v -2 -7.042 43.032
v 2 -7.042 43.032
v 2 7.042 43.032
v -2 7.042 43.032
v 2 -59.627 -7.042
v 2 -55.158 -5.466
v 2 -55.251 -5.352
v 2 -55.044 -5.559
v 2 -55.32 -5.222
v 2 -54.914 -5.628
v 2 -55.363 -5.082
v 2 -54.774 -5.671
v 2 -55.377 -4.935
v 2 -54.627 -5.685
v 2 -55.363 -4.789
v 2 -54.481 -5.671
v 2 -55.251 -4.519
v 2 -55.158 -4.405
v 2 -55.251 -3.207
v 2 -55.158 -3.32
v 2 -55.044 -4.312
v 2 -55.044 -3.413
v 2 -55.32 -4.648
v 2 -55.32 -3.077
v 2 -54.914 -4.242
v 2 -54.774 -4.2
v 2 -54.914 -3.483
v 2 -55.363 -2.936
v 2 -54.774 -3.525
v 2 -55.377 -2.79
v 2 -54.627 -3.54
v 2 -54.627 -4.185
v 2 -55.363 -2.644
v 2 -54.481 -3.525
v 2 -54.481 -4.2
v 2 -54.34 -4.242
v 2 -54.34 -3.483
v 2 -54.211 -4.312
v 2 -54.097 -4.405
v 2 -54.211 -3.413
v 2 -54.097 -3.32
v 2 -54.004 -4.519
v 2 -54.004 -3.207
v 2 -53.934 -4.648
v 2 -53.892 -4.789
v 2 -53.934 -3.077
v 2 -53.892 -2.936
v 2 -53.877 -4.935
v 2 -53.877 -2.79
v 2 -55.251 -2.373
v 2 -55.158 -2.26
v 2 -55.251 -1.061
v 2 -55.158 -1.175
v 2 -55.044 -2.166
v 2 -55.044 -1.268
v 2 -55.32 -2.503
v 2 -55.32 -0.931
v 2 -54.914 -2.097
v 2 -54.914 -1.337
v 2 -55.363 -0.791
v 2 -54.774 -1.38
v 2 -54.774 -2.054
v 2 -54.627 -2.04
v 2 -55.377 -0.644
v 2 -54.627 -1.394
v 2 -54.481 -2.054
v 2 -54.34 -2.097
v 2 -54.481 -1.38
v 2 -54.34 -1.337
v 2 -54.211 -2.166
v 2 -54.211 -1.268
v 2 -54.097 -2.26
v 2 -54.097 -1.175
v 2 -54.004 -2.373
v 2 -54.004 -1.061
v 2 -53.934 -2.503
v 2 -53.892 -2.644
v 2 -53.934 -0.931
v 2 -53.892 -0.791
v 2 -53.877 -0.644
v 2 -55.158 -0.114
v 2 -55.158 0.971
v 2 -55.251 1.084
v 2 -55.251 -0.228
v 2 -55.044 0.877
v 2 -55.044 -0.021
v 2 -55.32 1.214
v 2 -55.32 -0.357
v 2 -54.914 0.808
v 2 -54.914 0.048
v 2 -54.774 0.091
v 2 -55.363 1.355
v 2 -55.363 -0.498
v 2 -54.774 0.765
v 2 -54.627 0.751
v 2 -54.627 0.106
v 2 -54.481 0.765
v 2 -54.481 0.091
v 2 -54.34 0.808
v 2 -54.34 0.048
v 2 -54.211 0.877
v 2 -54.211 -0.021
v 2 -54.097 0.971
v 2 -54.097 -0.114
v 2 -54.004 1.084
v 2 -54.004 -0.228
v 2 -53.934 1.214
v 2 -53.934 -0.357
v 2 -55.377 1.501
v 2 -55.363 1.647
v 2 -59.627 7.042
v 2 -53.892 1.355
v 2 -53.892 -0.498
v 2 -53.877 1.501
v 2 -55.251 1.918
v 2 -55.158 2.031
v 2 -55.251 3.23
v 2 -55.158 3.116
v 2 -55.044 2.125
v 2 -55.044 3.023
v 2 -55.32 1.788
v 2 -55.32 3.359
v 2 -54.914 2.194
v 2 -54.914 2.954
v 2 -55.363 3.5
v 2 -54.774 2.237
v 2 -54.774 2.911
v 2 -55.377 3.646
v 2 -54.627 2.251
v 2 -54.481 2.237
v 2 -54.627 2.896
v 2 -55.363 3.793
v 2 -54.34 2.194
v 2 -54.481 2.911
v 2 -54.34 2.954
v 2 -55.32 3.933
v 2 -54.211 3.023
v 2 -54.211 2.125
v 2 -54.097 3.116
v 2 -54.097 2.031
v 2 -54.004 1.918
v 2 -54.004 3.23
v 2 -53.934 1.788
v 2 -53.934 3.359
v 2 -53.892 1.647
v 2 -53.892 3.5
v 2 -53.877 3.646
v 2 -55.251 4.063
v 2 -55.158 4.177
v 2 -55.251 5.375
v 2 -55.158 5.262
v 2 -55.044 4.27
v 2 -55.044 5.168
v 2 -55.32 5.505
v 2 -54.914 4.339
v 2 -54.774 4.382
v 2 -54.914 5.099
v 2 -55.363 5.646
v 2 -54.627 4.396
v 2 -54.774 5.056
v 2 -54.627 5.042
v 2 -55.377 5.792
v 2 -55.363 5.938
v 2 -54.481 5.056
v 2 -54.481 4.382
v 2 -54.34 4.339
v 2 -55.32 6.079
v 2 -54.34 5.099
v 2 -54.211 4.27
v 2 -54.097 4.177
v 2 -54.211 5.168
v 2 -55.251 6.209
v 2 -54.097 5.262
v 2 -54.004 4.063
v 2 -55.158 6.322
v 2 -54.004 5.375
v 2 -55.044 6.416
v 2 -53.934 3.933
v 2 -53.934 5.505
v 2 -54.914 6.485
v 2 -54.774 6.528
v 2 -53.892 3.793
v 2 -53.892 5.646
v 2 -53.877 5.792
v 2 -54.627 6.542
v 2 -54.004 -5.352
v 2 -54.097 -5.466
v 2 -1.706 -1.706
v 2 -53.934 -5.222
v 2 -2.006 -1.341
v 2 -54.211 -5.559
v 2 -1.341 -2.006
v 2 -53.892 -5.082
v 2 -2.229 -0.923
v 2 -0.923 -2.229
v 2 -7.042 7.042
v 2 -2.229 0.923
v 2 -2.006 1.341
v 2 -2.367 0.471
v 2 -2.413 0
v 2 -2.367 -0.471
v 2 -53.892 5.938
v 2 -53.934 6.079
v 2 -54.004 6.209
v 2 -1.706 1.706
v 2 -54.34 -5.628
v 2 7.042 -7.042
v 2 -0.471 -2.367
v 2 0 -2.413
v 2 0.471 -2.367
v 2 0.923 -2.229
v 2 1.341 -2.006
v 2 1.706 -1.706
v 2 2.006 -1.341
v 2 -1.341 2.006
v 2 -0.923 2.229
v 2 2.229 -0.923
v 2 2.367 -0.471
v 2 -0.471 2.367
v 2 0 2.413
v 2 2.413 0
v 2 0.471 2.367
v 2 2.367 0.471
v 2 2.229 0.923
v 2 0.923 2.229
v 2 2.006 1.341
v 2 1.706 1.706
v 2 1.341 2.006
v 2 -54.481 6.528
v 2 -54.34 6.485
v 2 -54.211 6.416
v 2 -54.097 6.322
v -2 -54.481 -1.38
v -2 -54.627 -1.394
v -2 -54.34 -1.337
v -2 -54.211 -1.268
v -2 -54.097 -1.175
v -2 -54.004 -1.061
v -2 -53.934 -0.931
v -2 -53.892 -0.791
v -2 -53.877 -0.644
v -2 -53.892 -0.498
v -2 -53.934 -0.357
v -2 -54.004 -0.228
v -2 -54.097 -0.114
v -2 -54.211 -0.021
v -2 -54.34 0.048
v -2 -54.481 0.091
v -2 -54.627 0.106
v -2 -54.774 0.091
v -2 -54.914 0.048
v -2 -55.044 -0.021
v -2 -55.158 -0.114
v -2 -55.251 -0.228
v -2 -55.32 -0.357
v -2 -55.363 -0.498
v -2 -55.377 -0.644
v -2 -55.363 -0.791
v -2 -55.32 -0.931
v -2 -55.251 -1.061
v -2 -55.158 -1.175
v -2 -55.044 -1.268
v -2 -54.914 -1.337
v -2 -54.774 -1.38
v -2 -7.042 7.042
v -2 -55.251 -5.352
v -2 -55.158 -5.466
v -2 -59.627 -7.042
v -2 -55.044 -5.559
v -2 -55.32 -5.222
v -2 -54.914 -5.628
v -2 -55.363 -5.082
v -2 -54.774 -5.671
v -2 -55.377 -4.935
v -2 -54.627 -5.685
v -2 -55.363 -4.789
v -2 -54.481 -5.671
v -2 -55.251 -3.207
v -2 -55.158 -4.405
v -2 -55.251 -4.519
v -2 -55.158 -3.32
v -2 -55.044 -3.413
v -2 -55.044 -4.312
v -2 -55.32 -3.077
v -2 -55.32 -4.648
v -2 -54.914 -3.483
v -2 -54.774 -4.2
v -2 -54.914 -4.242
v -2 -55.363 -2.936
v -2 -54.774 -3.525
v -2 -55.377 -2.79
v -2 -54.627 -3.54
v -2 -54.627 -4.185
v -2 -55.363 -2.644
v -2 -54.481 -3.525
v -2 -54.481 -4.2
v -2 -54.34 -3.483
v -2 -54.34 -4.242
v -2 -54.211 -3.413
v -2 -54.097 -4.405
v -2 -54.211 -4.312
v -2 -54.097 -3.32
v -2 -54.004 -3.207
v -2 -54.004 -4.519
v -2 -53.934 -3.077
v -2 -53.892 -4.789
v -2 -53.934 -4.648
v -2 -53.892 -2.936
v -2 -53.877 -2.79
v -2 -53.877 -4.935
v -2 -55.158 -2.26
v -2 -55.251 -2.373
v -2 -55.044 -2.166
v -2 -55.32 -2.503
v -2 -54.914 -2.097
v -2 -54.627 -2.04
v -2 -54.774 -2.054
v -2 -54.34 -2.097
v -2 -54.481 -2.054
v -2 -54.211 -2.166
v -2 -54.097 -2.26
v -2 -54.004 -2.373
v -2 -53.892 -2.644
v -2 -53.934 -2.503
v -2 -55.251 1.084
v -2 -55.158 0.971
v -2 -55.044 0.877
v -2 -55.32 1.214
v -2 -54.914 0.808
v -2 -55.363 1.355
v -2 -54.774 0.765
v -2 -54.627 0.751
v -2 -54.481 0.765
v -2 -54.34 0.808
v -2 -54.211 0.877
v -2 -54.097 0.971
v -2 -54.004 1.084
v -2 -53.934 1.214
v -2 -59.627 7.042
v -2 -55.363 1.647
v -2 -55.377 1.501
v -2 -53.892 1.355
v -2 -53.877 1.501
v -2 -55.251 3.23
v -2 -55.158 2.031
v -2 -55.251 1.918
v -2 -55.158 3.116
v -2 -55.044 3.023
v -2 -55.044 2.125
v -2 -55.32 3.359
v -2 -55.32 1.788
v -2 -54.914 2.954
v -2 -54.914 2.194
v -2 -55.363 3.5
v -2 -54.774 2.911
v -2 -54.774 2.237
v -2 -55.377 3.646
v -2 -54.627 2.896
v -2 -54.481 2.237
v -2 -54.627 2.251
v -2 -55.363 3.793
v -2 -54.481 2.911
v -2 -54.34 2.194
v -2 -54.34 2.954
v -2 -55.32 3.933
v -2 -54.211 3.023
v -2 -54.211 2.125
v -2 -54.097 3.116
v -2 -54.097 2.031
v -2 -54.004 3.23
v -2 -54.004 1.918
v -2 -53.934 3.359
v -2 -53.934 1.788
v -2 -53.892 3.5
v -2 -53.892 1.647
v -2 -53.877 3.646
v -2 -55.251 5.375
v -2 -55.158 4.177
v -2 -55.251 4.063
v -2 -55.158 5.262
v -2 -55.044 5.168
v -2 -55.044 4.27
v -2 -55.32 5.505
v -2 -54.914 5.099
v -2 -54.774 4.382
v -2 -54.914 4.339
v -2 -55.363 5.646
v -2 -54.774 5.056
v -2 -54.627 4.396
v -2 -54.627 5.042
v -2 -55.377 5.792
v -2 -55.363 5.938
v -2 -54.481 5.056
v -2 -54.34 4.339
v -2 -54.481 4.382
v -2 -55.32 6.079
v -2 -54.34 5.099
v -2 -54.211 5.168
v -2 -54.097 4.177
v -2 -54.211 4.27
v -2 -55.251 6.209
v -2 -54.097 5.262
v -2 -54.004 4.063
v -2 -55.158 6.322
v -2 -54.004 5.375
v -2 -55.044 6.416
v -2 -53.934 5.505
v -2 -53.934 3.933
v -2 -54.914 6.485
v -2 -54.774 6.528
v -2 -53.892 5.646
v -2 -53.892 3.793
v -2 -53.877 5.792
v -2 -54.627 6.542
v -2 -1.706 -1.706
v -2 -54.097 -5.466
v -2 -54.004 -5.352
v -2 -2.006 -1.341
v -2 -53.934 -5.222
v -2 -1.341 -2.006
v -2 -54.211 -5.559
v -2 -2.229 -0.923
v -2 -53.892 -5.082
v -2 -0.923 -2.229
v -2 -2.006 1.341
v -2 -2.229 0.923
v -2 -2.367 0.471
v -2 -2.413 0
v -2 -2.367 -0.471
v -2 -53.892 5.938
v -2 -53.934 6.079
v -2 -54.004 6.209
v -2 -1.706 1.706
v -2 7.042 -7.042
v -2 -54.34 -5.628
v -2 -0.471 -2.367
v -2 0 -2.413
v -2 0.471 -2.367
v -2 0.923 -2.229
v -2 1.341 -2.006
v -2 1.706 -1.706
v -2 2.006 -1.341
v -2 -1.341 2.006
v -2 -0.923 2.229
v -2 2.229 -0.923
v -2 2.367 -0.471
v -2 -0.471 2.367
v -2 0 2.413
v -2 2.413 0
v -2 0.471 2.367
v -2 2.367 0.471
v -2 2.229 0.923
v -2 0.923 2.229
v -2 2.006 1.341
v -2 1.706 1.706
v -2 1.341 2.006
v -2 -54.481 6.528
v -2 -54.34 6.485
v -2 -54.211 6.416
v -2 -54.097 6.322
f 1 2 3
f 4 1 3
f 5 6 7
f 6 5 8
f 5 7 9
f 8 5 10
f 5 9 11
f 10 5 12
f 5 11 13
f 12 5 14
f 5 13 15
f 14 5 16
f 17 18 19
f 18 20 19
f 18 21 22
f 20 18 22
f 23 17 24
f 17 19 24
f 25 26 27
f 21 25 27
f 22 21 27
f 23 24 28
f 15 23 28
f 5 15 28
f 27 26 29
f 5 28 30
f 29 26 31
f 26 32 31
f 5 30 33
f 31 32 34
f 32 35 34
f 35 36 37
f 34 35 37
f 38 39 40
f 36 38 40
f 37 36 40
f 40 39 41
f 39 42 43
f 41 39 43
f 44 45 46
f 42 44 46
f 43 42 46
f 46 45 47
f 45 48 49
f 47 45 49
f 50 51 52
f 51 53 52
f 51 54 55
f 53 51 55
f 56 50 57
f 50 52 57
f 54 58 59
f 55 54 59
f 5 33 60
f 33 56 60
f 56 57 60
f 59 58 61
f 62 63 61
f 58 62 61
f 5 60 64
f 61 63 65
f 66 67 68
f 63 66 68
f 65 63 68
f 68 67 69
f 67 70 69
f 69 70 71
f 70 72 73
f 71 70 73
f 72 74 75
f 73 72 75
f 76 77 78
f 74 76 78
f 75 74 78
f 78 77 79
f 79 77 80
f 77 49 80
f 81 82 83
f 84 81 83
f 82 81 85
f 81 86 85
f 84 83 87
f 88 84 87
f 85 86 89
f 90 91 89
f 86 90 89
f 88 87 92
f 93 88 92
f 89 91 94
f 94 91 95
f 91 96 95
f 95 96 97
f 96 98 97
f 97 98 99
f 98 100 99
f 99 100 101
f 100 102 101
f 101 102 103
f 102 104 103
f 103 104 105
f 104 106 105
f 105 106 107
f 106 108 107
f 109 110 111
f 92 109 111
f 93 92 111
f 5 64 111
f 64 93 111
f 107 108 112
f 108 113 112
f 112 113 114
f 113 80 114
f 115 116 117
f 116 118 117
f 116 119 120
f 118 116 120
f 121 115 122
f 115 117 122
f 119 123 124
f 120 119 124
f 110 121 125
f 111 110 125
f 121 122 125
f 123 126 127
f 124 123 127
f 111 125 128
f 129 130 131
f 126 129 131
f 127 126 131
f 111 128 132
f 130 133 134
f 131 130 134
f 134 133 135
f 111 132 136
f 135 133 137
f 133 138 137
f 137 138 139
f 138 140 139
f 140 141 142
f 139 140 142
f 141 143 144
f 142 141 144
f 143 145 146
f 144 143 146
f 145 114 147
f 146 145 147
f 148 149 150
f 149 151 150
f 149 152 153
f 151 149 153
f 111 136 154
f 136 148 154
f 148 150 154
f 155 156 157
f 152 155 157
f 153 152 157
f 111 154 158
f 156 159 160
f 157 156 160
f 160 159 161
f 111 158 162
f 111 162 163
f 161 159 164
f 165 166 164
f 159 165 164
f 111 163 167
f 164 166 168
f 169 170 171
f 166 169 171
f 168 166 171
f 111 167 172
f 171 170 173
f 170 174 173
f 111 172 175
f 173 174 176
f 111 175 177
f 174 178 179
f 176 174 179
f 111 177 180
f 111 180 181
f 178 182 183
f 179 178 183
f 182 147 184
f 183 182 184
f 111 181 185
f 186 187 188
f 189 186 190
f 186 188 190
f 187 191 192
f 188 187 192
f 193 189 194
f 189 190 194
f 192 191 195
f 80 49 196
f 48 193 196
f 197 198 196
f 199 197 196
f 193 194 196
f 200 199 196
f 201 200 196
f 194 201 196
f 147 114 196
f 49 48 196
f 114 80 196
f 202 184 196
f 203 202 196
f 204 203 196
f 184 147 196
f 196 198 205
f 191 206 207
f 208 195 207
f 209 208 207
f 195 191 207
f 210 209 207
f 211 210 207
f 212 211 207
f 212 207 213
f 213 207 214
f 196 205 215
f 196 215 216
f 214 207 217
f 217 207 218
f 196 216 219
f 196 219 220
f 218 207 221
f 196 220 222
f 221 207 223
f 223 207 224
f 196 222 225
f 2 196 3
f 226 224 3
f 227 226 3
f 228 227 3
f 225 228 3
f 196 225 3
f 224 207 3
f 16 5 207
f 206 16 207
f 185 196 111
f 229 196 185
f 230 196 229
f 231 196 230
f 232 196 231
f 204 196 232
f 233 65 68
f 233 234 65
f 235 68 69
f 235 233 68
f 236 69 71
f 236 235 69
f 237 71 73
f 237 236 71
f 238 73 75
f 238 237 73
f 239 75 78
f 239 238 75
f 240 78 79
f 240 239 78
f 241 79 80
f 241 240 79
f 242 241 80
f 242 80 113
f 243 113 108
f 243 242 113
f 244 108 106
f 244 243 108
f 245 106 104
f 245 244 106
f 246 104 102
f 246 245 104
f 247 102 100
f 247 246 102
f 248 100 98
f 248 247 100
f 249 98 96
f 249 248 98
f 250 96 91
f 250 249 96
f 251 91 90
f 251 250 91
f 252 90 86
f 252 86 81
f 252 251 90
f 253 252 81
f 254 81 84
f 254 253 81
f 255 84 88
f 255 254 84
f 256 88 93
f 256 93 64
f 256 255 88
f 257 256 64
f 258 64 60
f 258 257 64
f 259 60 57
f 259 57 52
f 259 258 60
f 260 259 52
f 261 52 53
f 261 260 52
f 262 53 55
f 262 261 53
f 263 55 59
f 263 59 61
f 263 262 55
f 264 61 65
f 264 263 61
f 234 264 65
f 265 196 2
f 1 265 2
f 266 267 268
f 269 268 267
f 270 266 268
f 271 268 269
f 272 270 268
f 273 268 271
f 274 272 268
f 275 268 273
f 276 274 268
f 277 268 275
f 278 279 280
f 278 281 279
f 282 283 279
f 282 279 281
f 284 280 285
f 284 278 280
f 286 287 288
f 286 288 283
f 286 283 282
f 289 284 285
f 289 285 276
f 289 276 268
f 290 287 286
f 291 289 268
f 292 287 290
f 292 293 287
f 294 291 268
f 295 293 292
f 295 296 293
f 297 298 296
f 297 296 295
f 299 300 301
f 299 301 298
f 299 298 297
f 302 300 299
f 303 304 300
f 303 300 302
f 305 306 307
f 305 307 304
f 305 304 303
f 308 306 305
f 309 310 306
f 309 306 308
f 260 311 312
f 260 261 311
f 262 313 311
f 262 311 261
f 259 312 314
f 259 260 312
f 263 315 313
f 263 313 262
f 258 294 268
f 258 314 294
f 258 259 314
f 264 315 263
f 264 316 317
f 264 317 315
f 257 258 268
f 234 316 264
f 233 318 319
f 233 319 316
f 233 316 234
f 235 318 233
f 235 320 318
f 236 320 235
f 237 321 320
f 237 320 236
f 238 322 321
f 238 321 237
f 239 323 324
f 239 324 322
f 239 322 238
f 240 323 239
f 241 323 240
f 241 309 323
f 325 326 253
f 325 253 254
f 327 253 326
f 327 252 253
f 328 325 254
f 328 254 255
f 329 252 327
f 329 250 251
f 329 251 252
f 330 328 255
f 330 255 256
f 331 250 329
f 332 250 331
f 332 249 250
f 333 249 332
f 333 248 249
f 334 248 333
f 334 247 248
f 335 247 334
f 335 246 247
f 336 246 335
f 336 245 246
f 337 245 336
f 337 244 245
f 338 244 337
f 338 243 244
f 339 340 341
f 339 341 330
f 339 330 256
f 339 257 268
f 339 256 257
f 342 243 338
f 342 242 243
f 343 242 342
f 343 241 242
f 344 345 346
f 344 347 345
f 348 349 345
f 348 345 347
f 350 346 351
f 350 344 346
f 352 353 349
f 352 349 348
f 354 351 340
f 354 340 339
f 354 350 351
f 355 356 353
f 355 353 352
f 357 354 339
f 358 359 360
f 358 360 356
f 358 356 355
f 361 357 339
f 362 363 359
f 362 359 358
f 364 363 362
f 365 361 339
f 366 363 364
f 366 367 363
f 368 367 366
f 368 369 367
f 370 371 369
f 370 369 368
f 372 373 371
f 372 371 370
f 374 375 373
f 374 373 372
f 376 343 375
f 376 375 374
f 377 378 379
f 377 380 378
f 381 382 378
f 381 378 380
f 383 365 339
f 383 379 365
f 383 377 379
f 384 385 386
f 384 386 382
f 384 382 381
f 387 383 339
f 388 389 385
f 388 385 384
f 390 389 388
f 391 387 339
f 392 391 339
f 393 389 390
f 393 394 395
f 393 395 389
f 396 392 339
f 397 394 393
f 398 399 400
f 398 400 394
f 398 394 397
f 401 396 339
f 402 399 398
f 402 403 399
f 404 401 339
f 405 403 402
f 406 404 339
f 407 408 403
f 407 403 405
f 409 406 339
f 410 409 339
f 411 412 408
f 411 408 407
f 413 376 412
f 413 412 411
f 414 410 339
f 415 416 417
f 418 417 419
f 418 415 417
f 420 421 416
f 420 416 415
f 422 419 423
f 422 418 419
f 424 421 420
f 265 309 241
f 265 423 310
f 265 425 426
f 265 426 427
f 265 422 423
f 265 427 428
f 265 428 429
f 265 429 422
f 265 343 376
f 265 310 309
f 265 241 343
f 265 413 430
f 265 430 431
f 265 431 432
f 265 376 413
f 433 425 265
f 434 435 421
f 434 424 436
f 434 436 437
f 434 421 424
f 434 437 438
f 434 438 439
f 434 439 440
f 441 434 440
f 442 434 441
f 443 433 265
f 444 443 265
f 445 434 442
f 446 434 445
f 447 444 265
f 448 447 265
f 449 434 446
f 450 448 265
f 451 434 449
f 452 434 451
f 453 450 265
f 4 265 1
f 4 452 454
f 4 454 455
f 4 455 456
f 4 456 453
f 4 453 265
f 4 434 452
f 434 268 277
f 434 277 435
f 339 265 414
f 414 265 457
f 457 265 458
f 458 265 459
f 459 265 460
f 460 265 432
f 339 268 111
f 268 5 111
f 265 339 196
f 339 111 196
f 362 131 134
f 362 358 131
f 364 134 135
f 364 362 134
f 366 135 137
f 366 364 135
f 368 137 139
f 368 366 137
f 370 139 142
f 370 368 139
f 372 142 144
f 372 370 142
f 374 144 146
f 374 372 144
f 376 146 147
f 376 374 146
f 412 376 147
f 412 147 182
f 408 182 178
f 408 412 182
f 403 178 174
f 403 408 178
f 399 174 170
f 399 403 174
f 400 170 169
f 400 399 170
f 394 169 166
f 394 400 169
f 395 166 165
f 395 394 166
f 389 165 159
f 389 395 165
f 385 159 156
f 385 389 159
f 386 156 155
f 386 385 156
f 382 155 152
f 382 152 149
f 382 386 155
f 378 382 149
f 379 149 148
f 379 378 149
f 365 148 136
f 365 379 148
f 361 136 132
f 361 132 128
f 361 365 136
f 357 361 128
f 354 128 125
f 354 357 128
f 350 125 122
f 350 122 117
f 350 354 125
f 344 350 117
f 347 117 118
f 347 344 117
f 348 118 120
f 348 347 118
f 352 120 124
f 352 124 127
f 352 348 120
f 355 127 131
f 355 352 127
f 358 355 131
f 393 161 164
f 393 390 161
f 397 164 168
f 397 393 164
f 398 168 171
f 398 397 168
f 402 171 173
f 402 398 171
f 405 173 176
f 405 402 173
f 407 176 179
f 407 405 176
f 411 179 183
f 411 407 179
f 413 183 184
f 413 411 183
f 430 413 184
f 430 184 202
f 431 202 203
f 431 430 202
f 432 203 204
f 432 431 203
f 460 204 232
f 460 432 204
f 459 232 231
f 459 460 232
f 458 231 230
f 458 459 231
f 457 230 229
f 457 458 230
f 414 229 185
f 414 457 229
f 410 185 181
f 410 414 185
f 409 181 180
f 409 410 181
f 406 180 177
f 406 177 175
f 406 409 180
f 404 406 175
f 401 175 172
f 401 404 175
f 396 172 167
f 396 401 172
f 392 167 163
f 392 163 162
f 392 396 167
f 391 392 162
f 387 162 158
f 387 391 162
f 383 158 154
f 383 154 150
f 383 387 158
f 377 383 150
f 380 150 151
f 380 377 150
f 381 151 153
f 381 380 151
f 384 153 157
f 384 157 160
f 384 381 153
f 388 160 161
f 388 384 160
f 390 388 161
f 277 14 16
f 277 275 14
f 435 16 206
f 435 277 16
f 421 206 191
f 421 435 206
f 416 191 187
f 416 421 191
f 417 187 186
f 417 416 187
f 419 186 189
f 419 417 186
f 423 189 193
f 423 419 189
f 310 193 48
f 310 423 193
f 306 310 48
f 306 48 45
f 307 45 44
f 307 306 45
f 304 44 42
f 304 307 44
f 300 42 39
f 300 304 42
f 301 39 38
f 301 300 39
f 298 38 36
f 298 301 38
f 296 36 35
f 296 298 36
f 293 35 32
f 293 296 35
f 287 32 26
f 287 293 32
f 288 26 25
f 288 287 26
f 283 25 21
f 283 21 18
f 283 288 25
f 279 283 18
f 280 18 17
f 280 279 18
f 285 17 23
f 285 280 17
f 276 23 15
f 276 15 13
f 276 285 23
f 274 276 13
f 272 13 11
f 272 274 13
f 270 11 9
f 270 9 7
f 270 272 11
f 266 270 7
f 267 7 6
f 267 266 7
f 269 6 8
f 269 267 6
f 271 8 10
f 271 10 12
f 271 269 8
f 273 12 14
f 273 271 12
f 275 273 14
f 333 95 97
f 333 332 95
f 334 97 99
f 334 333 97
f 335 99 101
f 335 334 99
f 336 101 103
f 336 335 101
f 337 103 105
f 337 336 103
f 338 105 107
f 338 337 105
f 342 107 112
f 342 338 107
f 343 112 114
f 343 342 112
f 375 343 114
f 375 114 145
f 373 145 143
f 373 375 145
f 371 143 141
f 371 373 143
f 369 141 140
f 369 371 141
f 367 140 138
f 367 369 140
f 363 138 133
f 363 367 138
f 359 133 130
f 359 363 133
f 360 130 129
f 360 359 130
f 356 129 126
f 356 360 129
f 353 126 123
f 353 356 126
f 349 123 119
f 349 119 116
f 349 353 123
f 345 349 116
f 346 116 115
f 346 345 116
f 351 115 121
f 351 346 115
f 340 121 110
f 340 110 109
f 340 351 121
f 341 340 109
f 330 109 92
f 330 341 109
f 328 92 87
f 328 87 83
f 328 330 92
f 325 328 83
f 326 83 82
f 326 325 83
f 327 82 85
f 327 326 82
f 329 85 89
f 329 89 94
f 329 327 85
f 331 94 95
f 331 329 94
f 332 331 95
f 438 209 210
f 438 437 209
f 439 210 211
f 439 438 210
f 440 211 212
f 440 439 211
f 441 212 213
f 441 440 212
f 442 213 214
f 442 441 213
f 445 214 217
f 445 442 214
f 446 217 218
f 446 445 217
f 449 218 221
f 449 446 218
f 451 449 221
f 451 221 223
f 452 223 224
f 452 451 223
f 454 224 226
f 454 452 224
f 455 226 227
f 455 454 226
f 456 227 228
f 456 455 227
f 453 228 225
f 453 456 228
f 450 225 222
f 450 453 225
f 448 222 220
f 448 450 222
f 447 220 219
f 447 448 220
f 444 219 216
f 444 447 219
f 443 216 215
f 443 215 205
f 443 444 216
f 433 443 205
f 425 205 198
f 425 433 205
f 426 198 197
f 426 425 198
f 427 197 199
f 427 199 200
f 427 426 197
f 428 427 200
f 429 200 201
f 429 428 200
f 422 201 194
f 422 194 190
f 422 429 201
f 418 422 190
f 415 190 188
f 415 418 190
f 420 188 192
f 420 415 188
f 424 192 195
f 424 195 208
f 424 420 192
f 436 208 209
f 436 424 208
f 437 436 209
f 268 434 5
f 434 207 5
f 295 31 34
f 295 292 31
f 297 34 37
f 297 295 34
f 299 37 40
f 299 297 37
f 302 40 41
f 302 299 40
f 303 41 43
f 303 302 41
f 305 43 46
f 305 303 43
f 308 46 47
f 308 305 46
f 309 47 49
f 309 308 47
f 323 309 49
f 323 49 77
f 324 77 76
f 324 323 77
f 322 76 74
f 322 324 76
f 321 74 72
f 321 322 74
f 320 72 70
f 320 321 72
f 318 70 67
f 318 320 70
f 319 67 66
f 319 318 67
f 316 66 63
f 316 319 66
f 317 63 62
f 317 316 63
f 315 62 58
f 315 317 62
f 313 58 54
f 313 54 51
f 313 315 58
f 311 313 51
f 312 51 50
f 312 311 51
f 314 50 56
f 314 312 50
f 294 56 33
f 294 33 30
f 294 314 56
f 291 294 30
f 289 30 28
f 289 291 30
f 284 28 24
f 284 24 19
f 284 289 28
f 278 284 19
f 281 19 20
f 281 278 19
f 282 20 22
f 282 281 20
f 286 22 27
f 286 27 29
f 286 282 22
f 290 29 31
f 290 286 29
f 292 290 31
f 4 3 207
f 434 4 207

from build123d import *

# Parameters (mm, degrees)
SKETCH1_R           = 2.413
SKETCH1_R_2         = 0.75
BOSS_EXTRUDE1_DEPTH = 2


with BuildPart() as part:
    # Sketch1 → Boss-Extrude1 (new, symmetric)
    with BuildSketch(Plane(origin=(0, 0, 0), x_dir=(0, 0, -1), z_dir=(1, 0, 0))):
        Polygon((-43.032150888, 7.041925615), (7.041925615, 7.041925615), (7.041925615, -59.627321198), (-7.041925615, -59.627321198), (-7.041925615, -7.041925615), (-43.032150888, -7.041925615), align=None)
        Circle(SKETCH1_R, mode=Mode.SUBTRACT)
        with Locations((-5.791925615, -54.627321198)):
            Circle(SKETCH1_R_2, mode=Mode.SUBTRACT)
        with Locations((-3.64647107, -54.627321198)):
            Circle(SKETCH1_R_2, mode=Mode.SUBTRACT)
        with Locations((-1.501016524, -54.627321198)):
            Circle(SKETCH1_R_2, mode=Mode.SUBTRACT)
        with Locations((0.644438021, -54.627321198)):
            Circle(SKETCH1_R_2, mode=Mode.SUBTRACT)
        with Locations((2.789892567, -54.627321198)):
            Circle(SKETCH1_R_2, mode=Mode.SUBTRACT)
        with Locations((4.935347112, -54.627321198)):
            Circle(SKETCH1_R_2, mode=Mode.SUBTRACT)
    extrude(amount=BOSS_EXTRUDE1_DEPTH, both=True)


solid = part.part
